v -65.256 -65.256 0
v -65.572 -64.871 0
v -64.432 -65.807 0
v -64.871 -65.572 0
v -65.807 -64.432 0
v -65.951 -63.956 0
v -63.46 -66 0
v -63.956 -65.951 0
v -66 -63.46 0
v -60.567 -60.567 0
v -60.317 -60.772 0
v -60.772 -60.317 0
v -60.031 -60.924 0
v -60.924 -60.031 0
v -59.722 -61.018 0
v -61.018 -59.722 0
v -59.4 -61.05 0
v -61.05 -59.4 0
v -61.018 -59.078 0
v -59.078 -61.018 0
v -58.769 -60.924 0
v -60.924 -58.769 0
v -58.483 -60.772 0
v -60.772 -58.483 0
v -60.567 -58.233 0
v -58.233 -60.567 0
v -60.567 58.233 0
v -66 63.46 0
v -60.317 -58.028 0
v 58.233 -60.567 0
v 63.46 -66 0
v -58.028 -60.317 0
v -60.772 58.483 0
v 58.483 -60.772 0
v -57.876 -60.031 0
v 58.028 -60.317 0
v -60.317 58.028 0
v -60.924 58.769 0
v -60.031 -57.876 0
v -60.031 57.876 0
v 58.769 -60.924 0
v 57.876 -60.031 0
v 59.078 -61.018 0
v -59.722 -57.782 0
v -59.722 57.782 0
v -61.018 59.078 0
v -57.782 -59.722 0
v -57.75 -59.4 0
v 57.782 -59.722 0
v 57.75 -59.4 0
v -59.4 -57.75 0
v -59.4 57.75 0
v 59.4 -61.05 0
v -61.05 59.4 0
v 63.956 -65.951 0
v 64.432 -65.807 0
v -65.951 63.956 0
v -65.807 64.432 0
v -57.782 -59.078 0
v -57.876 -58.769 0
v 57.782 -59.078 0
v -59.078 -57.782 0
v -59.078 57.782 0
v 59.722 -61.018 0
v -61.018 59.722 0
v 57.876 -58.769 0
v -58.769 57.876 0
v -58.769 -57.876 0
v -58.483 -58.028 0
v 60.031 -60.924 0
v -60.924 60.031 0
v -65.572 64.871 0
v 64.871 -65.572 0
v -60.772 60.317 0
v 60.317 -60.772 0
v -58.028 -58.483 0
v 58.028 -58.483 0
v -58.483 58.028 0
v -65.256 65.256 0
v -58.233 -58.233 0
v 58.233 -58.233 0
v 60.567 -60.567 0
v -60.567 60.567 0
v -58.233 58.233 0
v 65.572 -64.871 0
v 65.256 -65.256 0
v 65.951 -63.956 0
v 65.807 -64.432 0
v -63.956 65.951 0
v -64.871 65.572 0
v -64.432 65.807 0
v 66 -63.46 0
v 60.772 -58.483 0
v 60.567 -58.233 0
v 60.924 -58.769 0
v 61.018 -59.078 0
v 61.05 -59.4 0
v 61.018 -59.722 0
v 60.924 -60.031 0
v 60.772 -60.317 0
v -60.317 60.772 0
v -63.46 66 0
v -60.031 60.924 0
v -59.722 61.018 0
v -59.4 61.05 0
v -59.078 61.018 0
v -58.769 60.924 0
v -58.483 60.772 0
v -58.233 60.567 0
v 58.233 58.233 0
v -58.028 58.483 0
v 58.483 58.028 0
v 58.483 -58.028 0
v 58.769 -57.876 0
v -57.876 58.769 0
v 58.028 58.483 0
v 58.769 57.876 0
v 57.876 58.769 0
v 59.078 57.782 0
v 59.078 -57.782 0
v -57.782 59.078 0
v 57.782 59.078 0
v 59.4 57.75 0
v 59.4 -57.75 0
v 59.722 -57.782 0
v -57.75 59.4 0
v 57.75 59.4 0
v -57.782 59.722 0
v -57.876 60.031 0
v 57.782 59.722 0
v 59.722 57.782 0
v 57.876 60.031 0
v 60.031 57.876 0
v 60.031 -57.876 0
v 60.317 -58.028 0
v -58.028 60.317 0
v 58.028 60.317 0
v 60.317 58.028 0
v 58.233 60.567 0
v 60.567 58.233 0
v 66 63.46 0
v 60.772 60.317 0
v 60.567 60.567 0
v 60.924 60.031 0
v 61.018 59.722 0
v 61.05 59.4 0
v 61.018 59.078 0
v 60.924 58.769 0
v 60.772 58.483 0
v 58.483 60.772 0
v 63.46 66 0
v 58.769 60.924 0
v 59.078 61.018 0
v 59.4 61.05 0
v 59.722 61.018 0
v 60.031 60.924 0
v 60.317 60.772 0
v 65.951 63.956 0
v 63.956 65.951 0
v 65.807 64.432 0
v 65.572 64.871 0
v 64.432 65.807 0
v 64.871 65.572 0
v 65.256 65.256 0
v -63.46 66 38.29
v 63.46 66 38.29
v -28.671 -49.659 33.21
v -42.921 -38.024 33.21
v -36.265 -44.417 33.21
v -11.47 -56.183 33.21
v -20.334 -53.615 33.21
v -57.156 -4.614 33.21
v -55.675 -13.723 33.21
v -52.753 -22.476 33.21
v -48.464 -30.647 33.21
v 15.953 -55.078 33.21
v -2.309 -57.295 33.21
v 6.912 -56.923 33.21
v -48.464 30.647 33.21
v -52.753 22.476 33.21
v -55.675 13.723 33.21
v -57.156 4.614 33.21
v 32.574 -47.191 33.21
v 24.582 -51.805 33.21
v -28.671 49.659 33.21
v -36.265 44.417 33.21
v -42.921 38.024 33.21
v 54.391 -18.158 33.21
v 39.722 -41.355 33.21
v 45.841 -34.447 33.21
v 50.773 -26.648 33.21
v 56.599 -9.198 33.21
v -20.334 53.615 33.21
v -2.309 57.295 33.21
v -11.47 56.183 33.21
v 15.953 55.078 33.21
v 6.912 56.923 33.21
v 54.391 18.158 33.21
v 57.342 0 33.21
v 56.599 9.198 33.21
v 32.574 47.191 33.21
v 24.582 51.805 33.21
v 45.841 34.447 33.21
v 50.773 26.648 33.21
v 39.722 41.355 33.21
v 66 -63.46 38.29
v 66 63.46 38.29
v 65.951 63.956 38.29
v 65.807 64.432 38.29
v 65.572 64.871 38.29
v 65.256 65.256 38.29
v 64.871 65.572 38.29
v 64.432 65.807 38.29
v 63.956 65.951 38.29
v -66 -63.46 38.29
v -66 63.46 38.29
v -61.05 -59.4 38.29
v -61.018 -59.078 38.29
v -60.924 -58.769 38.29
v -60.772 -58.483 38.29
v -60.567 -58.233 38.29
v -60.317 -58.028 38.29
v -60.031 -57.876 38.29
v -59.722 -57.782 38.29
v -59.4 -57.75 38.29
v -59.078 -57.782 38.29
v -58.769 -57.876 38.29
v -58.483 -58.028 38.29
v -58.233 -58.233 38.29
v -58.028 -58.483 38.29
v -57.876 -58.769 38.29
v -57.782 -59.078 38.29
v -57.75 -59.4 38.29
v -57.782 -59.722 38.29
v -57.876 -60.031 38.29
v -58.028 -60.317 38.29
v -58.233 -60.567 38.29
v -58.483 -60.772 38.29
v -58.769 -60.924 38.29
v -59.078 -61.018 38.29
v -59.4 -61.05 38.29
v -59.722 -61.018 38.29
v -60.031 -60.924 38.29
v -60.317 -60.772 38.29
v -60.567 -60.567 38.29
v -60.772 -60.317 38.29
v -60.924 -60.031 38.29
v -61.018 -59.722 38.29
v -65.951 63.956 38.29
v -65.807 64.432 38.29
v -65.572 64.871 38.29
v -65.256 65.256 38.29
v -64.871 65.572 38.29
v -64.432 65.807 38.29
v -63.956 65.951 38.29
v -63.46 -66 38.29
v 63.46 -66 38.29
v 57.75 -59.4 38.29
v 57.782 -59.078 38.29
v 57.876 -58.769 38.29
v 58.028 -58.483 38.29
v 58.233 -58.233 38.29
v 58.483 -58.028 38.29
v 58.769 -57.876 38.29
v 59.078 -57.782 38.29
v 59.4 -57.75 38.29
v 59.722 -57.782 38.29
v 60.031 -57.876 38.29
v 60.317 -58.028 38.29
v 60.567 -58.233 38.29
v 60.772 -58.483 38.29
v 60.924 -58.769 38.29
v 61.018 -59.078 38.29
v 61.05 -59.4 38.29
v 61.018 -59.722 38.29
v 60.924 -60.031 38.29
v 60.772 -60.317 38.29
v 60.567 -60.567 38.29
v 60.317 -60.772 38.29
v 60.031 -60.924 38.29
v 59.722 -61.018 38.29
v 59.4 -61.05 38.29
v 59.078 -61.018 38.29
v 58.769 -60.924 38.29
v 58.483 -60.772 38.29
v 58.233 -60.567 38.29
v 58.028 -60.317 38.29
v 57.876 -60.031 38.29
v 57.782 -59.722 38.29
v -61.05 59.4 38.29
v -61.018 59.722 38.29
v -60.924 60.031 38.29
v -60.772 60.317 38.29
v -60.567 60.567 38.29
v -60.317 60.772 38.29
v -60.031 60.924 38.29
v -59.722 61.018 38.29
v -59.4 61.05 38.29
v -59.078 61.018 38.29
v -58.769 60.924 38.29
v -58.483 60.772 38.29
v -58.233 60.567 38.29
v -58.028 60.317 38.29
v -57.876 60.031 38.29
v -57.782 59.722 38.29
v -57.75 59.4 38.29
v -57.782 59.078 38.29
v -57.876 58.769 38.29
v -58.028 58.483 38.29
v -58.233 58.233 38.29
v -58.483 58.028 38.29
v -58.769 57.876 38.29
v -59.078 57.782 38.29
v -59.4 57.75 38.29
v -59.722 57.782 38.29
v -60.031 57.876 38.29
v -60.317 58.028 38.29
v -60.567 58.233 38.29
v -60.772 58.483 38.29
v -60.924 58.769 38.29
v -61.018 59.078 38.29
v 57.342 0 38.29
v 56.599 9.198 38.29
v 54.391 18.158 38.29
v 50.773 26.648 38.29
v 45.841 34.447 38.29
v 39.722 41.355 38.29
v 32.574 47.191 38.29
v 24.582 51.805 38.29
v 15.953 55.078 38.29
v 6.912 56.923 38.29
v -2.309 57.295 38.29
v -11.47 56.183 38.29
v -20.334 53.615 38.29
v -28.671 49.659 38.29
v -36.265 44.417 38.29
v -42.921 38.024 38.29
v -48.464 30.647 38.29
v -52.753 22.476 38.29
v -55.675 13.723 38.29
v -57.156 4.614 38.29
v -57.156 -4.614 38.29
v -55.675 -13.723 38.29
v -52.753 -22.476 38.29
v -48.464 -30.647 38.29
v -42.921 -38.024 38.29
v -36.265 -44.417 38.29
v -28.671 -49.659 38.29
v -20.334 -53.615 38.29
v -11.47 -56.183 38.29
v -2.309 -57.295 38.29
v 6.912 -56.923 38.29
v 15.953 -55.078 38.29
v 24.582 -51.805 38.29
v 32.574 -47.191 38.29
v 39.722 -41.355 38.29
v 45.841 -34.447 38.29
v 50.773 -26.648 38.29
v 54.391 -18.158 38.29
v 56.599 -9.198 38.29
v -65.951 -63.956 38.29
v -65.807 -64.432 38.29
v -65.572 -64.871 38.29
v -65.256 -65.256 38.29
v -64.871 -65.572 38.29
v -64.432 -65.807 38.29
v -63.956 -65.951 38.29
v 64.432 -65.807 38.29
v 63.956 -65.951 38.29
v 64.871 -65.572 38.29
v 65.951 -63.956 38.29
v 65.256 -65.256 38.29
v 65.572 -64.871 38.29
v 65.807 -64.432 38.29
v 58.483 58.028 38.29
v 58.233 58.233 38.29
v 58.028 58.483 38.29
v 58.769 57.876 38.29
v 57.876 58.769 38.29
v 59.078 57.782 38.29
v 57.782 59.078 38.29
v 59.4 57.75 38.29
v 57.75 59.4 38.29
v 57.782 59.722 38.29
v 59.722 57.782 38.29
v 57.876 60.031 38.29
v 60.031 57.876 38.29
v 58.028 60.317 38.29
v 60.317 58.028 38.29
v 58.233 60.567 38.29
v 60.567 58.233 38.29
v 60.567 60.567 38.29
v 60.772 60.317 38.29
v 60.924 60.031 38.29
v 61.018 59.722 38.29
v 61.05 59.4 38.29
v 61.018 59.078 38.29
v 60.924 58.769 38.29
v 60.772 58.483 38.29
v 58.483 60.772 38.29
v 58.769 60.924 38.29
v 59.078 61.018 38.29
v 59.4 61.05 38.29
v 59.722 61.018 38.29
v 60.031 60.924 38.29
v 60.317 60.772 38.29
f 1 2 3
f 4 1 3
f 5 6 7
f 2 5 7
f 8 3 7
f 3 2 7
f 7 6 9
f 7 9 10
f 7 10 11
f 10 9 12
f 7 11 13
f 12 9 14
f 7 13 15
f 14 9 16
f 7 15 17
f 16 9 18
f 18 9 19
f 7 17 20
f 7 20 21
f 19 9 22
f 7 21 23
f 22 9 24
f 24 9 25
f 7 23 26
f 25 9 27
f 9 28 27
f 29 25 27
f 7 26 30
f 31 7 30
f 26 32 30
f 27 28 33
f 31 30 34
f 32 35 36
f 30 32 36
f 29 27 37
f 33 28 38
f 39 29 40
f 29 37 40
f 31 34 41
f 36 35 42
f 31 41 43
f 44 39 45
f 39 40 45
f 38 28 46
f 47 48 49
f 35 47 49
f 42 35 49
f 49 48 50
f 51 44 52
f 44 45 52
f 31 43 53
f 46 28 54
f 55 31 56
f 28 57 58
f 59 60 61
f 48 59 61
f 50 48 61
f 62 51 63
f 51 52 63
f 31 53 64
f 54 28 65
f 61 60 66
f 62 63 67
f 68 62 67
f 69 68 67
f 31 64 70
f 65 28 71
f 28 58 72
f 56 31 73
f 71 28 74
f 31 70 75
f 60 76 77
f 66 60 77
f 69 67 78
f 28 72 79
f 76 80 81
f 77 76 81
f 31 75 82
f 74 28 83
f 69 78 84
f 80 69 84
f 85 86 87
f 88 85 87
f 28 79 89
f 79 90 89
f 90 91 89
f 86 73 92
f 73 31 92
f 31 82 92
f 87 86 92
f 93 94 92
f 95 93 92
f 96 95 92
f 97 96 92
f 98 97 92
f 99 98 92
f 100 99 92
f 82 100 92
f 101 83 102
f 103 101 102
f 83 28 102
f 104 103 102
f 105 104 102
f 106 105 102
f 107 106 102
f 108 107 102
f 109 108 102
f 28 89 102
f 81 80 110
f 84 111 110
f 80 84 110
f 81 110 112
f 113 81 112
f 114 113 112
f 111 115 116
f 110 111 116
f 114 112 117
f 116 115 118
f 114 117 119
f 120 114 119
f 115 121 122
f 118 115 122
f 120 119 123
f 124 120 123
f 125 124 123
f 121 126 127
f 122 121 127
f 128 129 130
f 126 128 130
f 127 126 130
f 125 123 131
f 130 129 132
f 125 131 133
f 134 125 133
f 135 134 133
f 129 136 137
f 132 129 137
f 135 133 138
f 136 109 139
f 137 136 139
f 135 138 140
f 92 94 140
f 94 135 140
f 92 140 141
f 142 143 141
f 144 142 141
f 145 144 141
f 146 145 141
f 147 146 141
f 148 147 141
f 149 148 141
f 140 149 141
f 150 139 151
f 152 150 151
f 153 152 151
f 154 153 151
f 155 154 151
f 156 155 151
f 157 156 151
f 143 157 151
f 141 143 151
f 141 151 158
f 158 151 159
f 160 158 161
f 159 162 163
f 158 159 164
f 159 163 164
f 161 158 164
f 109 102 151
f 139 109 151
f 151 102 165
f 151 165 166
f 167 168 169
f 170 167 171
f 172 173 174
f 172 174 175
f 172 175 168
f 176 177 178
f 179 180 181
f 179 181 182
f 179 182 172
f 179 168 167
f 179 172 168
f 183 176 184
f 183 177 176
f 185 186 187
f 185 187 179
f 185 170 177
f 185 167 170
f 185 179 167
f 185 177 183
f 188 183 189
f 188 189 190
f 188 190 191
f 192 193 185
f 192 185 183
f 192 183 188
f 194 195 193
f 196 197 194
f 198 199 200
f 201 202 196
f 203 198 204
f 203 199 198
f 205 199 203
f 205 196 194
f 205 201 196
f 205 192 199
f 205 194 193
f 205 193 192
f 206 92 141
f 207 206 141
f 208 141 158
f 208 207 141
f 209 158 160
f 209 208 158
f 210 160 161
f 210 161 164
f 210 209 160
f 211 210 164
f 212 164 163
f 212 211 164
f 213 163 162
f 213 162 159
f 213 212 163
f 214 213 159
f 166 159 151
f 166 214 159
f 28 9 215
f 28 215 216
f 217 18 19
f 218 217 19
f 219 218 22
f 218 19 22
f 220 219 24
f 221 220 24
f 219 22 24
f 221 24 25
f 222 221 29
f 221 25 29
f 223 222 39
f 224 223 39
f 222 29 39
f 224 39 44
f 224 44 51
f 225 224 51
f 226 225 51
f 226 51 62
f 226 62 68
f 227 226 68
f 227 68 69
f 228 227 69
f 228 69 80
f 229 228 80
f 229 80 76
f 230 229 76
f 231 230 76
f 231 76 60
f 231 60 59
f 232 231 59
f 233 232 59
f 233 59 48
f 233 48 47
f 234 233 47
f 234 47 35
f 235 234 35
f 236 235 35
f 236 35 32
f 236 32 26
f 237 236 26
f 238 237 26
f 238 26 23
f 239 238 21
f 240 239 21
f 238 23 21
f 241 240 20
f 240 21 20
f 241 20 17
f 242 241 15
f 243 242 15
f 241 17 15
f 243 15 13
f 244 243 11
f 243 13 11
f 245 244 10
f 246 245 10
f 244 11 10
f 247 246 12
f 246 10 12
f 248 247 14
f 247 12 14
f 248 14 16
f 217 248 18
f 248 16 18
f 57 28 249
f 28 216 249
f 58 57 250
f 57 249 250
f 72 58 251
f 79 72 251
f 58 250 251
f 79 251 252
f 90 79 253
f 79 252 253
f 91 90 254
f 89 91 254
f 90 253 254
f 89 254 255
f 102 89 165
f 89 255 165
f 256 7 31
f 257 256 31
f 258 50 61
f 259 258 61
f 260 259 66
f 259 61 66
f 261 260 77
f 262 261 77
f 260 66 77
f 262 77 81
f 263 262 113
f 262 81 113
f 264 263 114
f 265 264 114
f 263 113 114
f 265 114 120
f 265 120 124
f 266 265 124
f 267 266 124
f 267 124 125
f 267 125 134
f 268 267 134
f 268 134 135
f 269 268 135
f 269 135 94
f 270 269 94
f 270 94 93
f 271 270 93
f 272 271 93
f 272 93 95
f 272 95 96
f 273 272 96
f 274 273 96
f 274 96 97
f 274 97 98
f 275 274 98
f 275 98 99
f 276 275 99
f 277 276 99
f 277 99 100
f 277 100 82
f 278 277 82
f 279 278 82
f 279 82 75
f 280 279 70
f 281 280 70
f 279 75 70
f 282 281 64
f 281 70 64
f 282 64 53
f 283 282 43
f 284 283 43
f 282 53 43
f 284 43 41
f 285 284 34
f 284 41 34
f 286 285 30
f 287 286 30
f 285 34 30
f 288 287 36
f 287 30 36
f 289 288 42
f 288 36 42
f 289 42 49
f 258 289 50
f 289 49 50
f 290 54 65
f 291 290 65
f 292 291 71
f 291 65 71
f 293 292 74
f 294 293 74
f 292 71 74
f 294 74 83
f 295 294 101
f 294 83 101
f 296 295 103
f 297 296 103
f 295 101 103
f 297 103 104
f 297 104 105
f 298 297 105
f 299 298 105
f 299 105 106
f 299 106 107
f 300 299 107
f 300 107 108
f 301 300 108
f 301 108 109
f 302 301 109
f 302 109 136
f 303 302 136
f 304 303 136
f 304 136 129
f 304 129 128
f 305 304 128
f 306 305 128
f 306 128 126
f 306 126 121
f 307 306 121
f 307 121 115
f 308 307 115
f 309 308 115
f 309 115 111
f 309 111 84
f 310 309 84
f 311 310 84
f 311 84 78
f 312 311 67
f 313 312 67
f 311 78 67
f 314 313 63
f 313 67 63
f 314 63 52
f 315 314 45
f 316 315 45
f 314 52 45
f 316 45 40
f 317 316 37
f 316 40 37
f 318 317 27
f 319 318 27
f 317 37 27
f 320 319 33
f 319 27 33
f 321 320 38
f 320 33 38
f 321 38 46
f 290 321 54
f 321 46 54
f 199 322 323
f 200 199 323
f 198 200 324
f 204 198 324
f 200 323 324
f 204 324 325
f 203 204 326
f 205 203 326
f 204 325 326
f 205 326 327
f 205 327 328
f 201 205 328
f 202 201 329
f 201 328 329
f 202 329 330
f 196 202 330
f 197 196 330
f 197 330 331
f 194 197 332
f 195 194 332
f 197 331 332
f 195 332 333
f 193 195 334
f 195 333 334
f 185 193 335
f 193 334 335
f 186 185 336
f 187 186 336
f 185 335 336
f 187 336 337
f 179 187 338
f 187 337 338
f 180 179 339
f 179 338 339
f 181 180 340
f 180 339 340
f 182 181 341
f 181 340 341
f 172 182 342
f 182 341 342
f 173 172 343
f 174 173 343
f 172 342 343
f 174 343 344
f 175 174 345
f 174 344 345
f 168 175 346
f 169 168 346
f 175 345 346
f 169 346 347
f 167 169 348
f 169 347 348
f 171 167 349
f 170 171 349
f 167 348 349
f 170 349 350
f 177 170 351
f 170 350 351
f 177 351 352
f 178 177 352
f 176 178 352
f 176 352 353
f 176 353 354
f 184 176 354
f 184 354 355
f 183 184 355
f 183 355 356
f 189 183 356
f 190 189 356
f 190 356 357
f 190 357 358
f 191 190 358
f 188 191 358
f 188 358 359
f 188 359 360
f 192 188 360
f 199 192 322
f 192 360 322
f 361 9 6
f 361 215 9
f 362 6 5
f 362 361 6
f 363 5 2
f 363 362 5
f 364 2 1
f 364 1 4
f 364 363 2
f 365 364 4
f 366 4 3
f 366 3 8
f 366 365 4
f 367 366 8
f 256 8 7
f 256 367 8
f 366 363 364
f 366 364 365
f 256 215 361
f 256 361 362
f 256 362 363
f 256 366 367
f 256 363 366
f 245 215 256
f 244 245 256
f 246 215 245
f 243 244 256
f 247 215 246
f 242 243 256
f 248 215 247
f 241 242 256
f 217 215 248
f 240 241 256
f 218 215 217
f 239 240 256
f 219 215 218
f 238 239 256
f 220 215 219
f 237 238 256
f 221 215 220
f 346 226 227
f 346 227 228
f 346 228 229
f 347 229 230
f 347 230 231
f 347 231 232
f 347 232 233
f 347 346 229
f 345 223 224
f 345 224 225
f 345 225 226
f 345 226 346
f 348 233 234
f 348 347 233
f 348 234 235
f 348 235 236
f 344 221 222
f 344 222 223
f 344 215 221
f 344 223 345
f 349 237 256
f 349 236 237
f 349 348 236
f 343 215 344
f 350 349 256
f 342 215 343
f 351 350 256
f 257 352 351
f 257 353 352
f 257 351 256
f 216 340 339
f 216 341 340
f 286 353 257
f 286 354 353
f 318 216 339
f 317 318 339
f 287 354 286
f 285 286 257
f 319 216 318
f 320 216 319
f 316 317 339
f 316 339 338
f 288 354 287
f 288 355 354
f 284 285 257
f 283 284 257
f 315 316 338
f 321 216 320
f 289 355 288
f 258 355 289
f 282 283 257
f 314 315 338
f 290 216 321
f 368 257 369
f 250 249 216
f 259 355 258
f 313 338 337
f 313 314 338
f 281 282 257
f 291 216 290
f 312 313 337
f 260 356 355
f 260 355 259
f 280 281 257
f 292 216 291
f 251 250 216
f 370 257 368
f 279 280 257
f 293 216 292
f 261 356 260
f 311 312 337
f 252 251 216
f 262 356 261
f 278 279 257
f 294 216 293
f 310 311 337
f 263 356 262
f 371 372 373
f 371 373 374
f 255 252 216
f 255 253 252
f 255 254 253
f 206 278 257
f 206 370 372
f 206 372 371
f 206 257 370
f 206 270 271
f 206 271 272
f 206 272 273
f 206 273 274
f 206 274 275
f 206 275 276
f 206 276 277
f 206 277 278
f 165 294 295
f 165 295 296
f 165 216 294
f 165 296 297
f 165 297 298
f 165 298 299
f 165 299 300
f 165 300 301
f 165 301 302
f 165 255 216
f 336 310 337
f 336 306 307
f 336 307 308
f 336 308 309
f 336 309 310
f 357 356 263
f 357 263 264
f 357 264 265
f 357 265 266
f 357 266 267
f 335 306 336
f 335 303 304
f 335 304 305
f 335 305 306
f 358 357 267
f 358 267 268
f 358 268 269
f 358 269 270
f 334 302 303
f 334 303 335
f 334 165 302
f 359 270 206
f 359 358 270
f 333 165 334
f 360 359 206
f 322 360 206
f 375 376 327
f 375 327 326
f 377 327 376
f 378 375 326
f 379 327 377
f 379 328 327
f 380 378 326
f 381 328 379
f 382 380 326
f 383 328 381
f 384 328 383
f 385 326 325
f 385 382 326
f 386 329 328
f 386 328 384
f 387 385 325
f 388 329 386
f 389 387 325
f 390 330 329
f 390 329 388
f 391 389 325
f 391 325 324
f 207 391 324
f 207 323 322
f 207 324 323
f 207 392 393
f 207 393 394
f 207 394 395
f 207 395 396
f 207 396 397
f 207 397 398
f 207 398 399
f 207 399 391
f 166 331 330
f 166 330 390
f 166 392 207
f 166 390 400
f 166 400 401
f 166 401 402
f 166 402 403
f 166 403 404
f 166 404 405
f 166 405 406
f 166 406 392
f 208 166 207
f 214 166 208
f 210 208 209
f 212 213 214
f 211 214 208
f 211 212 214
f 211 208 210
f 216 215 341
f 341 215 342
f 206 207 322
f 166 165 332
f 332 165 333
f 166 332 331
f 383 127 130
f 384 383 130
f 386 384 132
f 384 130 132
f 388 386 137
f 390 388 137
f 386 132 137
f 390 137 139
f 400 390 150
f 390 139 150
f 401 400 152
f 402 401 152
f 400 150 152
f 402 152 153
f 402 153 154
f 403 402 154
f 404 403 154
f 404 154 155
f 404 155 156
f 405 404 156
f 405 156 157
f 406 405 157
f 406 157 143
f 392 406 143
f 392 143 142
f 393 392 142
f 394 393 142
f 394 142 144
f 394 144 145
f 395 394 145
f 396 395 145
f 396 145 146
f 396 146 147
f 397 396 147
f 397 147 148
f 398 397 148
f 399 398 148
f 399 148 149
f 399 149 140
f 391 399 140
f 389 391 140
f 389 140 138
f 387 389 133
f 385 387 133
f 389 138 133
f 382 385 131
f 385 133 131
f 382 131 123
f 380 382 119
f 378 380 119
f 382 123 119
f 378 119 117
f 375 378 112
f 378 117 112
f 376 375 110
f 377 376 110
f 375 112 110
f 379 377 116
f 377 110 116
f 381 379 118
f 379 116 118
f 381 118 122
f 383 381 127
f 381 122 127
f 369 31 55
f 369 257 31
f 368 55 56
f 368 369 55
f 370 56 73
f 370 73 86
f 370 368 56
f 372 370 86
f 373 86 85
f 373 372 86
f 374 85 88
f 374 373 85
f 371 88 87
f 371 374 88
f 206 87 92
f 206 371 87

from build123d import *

# Parameters (mm, degrees)
SKETCH1_W             = 132
SKETCH1_H             = 132
BOSS_EXTRUDE1_DEPTH   = 38.29
FILLET1_R             = 2.54
M4X0_7_TAPPED_HOLE1_D = 3.3
SKETCH4_R             = 57.341527379
CUT_EXTRUDE1_DEPTH    = 5.08


with BuildPart() as part:
    # Sketch1 → Boss-Extrude1 (new body)
    with BuildSketch(Plane.XY):
        Rectangle(SKETCH1_W, SKETCH1_H)
    extrude(amount=BOSS_EXTRUDE1_DEPTH)

    # Fillet1
    fillet1_edges = [part.edges().sort_by_distance(p)[0] for p in [
        (66, -66, 19.145),
        (-66, -66, 19.145),
        (-66, 66, 19.145),
        (66, 66, 19.145),
    ]]
    fillet(fillet1_edges, radius=FILLET1_R)

    # M4x0.7 Tapped Hole1 (through all)
    with Locations(Plane.XY.offset(38.29)):
        with Locations((-59.4, 59.4), (59.4, 59.4), (59.4, -59.4), (-59.4, -59.4)):
            Hole(M4X0_7_TAPPED_HOLE1_D / 2)

    # Sketch4 → Cut-Extrude1 (cut)
    with BuildSketch(Plane.XY.offset(38.29)):
        Circle(SKETCH4_R)
    extrude(amount=-CUT_EXTRUDE1_DEPTH, mode=Mode.SUBTRACT)


solid = part.part
